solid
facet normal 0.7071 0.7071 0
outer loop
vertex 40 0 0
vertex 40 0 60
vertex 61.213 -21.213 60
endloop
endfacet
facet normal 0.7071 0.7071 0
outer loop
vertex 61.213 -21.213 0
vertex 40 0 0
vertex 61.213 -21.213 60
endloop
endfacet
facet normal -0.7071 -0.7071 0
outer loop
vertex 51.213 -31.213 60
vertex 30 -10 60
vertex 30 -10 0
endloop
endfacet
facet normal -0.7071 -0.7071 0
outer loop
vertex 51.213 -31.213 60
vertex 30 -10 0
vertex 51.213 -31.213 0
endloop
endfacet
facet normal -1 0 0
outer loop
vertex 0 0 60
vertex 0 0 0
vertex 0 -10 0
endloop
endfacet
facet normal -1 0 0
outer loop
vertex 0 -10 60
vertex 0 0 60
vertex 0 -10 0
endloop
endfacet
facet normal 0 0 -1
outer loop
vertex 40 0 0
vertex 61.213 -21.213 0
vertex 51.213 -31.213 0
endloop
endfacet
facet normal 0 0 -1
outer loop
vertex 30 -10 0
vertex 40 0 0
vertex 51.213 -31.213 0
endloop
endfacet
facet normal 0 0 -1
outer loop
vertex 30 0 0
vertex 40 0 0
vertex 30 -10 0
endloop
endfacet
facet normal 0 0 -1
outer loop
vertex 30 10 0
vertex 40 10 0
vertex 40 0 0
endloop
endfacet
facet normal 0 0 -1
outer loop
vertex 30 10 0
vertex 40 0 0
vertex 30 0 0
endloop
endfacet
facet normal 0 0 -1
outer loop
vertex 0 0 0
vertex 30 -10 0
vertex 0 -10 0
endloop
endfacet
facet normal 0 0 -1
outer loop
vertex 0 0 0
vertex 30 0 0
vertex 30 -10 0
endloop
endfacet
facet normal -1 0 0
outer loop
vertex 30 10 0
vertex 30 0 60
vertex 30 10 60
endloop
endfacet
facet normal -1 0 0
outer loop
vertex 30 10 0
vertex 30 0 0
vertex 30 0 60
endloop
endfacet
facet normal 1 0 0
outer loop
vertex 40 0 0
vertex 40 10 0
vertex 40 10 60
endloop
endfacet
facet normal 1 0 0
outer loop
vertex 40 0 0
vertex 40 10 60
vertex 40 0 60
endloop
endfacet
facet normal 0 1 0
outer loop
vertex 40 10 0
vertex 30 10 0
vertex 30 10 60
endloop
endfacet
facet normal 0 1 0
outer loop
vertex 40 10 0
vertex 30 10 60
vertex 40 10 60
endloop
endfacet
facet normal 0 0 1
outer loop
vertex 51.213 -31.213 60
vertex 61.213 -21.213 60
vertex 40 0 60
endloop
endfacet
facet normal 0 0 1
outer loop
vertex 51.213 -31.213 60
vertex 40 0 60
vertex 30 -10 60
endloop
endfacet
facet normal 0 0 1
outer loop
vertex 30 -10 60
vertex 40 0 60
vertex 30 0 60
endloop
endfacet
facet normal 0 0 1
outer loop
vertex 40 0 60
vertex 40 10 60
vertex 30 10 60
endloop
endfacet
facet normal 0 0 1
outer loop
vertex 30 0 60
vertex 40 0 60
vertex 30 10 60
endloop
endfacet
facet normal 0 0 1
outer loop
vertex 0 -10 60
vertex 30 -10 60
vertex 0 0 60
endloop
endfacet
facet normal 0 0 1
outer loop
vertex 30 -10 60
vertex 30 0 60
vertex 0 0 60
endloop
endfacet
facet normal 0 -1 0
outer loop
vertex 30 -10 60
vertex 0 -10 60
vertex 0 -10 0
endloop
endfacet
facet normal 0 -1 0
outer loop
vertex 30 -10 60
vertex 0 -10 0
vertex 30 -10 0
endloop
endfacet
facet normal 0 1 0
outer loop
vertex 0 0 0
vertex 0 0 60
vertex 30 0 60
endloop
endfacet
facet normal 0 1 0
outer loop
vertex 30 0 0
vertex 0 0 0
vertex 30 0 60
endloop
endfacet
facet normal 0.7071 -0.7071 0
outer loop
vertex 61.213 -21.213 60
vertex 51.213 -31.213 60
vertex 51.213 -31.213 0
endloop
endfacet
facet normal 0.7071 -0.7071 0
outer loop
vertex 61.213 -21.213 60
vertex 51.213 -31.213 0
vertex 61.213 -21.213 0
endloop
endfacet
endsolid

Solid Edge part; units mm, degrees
sketch "Sketch1" plane through (0, 0, 0) normal (0, 0, 1) x (1, 0, 0)
  line L0 (0, 0) -> (30, 0)
  line L1 (30, 0) -> (30, 10)
  line L2 (30, 10) -> (40, 10)
  line L3 (40, 10) -> (40, 0)
  line L4 (40, 0) -> (61.2132, -21.2132)
  line L5 (51.2132, -31.2132) -> (61.2132, -21.2132)
  line L6 (30, -10) -> (51.2132, -31.2132)
  line L7 (0, -10) -> (30, -10)
  line L8 (0, 0) -> (0, -10)
extrude "Protrusion1" add sketch "Sketch1" along normal blind 60
